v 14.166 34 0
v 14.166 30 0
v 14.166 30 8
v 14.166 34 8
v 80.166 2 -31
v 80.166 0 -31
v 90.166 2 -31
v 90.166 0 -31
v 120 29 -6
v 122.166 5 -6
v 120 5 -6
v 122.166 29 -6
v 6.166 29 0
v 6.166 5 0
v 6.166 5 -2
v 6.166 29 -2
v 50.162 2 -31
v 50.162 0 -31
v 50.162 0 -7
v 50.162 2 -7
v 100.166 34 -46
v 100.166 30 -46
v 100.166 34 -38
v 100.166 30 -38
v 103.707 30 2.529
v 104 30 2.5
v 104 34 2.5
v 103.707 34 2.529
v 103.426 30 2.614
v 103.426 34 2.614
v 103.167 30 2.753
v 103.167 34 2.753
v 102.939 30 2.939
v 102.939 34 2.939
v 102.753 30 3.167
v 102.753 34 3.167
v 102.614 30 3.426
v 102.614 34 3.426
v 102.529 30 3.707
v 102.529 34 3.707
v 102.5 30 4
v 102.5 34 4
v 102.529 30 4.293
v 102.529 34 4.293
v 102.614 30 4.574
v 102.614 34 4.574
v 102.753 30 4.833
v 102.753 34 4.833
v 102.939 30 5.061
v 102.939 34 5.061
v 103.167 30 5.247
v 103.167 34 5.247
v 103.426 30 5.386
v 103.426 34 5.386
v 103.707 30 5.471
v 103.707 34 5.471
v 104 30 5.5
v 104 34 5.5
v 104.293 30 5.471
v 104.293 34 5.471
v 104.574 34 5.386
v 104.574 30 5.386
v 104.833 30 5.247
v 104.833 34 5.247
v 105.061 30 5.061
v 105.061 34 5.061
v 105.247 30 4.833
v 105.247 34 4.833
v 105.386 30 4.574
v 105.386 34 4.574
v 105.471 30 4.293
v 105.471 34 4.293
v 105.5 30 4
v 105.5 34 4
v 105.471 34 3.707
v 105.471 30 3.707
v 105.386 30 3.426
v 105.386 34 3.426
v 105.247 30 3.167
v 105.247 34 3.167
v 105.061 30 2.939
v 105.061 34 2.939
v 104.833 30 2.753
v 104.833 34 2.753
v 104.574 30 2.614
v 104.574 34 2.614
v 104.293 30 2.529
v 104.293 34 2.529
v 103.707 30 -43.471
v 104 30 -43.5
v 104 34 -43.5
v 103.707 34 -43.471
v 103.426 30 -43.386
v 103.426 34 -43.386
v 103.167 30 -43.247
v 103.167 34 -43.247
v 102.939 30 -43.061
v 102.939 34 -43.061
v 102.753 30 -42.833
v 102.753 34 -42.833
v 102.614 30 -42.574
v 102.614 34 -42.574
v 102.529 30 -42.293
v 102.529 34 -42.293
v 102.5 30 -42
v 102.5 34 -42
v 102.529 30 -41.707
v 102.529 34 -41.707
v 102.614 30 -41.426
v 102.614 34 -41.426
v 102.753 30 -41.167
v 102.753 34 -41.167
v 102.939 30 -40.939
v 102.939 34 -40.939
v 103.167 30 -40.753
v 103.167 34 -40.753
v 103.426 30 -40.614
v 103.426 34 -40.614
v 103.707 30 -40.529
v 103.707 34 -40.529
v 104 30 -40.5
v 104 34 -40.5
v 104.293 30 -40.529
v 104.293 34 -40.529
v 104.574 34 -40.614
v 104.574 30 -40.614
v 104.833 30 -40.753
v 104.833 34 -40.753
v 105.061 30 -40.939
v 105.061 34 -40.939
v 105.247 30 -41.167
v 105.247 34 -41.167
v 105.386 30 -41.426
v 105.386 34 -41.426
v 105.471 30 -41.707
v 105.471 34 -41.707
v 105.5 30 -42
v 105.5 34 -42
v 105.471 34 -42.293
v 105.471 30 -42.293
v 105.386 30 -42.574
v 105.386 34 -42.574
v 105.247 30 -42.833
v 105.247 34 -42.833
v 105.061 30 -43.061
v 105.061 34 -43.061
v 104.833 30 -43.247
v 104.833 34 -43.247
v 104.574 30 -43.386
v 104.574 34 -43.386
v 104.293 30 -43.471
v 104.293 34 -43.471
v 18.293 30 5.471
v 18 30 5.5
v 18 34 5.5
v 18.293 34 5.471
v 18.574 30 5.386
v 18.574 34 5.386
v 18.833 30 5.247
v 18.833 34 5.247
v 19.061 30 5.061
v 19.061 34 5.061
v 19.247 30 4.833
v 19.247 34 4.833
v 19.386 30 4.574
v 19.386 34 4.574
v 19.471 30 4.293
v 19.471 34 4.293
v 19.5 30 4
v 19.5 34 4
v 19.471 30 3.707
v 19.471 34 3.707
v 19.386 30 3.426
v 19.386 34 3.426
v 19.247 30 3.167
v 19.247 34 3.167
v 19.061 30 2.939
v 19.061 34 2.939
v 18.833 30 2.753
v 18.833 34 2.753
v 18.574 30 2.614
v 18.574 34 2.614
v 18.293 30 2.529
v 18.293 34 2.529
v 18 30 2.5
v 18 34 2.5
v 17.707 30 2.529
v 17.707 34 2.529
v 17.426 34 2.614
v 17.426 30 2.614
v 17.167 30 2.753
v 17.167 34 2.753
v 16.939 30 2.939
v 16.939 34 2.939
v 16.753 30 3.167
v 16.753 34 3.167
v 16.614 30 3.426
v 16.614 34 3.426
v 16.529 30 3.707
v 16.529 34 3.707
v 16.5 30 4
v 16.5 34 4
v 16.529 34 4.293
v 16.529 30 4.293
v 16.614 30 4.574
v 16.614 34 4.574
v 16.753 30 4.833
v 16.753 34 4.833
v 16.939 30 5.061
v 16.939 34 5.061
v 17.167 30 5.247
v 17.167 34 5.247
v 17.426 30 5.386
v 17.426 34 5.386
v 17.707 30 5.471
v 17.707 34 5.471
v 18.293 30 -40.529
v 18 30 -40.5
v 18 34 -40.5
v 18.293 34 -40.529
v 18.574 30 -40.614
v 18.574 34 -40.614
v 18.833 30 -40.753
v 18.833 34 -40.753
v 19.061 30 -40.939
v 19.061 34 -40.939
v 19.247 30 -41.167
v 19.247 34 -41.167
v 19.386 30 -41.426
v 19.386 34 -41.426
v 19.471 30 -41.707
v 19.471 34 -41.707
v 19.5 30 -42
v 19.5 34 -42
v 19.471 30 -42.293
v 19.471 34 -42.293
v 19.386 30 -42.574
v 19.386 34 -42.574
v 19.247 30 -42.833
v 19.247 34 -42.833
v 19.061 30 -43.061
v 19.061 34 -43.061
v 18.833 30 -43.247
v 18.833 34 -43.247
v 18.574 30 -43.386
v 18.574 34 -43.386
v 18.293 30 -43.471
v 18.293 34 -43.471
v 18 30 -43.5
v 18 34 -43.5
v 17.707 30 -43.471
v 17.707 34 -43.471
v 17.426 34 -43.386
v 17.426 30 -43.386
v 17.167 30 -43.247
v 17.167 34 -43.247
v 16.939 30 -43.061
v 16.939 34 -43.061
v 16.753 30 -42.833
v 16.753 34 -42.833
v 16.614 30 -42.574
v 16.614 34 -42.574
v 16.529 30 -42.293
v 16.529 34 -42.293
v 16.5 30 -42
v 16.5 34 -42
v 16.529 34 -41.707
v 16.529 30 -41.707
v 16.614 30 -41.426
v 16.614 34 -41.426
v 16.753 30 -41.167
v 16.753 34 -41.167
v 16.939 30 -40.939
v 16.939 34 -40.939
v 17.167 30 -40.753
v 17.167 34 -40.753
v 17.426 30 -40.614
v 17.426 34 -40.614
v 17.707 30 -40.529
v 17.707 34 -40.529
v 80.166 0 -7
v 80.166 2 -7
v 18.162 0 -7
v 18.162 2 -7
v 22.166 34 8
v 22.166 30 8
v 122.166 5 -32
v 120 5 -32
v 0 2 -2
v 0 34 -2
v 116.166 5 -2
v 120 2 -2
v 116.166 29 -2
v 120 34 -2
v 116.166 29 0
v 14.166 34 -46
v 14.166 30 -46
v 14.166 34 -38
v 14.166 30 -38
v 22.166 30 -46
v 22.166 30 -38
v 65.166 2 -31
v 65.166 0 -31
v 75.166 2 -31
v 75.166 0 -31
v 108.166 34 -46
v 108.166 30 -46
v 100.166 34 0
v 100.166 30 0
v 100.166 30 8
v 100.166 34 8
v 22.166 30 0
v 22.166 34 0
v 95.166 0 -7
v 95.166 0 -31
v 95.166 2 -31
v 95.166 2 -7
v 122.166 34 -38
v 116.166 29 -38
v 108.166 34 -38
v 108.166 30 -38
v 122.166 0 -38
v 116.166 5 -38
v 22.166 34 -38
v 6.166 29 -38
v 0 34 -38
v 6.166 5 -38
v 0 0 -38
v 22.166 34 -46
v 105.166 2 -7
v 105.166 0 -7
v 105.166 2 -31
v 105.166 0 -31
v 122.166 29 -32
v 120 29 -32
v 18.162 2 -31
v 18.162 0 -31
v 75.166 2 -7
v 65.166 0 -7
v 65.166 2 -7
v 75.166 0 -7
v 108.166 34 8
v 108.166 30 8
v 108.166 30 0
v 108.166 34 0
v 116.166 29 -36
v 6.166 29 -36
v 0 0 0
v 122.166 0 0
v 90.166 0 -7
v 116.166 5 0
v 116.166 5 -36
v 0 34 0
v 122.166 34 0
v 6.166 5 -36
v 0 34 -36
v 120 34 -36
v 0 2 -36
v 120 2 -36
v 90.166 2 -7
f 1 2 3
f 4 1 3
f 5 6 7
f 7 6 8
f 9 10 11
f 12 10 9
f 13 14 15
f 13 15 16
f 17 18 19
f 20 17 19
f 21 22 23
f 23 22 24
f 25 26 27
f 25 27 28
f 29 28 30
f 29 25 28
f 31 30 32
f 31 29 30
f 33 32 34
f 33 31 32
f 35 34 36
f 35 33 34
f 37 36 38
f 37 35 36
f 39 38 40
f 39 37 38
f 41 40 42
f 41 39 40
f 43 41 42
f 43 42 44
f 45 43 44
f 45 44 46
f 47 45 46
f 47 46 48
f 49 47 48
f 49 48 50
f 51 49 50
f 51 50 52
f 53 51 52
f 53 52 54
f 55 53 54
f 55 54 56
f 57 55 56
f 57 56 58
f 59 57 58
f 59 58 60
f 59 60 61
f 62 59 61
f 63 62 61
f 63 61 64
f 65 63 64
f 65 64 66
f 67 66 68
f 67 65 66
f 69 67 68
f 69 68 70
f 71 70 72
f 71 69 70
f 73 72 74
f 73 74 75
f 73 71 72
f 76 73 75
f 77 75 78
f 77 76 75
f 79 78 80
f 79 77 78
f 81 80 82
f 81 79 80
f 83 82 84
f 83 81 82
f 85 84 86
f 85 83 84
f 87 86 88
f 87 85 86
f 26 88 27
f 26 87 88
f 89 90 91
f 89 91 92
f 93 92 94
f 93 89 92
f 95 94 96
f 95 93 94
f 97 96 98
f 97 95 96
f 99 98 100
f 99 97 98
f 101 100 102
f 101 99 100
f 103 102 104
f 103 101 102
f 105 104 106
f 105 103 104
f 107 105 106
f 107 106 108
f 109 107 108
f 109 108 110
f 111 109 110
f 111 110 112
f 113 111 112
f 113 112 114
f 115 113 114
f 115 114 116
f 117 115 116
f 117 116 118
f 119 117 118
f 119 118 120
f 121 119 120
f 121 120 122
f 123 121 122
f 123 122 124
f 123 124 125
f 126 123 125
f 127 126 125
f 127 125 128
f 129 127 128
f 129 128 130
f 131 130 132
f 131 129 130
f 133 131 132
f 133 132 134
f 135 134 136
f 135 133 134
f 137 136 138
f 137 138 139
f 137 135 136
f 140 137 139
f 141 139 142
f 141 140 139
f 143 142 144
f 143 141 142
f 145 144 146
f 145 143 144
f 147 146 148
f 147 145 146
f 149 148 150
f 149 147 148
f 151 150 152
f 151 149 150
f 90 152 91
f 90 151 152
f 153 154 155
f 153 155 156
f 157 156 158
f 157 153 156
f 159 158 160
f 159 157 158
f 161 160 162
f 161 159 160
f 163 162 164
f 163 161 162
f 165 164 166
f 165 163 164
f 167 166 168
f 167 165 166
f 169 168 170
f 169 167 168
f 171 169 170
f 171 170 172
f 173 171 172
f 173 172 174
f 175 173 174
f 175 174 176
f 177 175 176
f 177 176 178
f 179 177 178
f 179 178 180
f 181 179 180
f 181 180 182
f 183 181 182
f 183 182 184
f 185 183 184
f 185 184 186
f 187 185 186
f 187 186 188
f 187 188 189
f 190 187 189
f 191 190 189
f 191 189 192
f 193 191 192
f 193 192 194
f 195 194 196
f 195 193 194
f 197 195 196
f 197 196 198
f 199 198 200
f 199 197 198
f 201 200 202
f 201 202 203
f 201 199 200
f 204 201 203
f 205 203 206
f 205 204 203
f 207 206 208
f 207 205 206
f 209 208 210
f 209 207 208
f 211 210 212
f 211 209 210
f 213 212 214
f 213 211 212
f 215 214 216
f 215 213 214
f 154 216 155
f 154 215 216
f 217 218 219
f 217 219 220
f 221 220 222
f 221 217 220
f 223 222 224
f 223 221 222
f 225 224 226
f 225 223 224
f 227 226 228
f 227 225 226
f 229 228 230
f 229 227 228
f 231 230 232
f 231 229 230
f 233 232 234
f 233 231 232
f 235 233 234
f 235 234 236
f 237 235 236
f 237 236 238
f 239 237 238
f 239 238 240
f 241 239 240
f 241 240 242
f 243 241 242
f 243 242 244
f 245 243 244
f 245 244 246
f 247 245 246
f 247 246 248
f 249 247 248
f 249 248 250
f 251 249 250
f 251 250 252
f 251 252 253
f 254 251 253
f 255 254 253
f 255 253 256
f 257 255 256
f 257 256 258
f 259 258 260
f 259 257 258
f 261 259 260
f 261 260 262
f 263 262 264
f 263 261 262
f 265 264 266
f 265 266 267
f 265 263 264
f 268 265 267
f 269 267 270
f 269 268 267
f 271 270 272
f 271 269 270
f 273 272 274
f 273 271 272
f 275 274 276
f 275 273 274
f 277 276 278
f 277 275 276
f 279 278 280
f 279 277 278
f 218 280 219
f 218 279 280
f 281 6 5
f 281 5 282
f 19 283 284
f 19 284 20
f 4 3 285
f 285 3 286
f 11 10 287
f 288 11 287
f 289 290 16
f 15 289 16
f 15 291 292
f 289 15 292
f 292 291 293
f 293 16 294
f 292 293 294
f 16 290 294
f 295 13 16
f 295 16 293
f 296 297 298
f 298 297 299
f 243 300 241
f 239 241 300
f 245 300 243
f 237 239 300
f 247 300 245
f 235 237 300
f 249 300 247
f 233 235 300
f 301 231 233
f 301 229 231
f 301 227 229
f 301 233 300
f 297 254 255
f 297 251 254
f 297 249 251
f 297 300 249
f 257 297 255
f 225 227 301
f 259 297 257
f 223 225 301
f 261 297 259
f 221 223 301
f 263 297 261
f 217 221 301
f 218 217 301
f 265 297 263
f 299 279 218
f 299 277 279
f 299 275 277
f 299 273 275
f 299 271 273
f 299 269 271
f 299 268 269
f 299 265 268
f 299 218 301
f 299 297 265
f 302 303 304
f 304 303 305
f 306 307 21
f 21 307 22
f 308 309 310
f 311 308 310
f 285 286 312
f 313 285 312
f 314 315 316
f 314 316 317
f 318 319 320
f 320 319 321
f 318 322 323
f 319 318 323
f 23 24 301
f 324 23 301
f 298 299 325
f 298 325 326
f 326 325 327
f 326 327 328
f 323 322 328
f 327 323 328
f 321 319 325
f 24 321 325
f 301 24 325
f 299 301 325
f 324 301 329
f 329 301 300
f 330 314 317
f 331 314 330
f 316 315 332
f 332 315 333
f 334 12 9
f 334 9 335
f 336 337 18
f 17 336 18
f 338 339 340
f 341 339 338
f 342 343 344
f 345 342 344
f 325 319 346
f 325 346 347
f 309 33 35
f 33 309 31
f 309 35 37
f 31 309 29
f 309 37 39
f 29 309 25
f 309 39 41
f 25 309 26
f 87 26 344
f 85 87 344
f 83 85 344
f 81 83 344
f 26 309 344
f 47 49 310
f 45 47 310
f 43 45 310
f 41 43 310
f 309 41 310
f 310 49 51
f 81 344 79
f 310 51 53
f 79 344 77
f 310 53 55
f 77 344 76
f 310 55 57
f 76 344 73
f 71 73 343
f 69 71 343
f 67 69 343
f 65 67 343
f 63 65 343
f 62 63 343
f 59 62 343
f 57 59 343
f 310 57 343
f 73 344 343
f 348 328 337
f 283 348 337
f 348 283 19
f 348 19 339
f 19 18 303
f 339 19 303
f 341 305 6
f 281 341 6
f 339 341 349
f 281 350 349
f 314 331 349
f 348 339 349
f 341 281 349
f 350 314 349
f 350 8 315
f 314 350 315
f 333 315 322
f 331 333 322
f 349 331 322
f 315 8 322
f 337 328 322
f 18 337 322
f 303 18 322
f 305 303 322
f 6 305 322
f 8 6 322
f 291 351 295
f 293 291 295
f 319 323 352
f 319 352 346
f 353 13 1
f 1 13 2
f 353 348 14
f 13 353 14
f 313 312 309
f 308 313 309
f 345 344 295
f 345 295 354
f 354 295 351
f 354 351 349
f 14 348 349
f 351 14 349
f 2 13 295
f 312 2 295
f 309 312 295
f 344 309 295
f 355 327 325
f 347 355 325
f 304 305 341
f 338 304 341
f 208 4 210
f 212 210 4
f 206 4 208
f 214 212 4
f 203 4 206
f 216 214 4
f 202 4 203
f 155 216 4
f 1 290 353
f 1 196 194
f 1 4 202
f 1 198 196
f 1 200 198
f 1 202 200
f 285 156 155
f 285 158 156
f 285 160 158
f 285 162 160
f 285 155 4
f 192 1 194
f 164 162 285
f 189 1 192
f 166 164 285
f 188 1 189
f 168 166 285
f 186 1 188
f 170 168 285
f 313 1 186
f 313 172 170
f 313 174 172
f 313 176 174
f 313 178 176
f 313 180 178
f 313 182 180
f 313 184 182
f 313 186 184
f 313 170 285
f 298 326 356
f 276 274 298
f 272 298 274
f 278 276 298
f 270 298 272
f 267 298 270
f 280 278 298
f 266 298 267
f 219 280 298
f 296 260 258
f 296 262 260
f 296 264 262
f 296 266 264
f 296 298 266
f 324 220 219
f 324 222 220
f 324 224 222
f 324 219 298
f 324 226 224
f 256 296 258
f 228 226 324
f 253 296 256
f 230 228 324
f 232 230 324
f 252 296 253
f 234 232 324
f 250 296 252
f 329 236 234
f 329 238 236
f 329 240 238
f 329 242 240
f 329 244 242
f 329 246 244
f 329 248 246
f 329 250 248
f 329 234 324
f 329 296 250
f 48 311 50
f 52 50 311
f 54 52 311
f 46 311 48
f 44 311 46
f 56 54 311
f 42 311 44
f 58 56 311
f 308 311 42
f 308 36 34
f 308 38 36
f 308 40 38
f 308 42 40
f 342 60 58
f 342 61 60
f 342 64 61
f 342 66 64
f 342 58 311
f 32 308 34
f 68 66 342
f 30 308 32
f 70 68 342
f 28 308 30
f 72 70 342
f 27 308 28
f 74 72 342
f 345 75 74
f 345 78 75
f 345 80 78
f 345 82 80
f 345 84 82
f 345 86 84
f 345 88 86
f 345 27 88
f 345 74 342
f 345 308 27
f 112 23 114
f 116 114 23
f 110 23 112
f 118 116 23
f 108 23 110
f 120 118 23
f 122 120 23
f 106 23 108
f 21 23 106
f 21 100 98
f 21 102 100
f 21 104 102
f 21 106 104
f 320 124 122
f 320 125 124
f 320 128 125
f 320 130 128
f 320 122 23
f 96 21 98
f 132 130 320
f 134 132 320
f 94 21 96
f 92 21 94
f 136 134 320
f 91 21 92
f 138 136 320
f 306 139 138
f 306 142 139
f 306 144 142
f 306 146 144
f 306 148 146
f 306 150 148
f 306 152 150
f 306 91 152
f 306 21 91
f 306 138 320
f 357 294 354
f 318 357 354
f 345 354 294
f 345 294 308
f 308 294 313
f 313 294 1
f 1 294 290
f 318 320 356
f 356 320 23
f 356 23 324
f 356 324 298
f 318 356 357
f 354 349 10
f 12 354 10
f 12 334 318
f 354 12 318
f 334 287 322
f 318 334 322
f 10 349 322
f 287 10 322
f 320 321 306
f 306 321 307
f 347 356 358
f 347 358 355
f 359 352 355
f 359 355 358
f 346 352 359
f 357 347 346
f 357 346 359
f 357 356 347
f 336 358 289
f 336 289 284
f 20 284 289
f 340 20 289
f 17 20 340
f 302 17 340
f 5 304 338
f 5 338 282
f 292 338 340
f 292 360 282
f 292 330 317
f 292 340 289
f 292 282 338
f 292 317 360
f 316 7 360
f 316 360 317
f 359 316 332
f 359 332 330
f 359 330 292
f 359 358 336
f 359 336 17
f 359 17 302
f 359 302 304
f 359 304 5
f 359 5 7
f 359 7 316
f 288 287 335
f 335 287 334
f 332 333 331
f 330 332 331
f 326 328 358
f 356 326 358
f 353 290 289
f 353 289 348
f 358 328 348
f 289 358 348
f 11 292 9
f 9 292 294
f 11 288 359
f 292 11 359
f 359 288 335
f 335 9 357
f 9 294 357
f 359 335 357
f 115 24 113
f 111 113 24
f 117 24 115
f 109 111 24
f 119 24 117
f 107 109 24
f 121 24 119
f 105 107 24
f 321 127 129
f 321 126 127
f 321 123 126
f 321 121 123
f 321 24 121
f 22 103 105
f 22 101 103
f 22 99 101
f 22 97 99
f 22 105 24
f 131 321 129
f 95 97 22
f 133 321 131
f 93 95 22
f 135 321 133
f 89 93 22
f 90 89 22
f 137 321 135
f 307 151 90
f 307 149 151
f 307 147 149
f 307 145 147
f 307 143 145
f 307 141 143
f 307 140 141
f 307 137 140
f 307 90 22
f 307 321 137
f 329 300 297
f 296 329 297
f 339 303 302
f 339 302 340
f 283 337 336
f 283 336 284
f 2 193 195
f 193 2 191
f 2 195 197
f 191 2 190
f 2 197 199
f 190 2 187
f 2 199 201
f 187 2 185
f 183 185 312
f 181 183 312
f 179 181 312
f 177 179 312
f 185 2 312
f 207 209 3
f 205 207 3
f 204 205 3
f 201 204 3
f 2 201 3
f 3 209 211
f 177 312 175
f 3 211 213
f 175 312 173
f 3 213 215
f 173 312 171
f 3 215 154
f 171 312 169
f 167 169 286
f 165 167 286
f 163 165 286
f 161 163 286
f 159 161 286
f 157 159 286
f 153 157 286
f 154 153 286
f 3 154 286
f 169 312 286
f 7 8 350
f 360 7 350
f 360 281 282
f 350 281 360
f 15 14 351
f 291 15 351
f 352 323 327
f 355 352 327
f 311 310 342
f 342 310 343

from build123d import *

# Parameters (mm, degrees)
SKETCH1_R              = 1.5
BOSS_EXTRUDE2_DEPTH    = 34
SKETCH3_W              = 120
SKETCH3_H              = 34
CUT_EXTRUDE1_DEPTH     = 32
CUT_EXTRUDE4_START     = -8
CUT_EXTRUDE4_OUTLINE_W = 8
CUT_EXTRUDE4_OUTLINE_H = 30
CUT_EXTRUDE4_DEPTH     = 8
CUT_EXTRUDE5_DEPTH     = 8
SKETCH8_W              = 8
SKETCH8_H              = 30
CUT_EXTRUDE6_DEPTH     = 8
SKETCH9_W              = 8
SKETCH9_H              = 30
CUT_EXTRUDE7_DEPTH     = 8
SKETCH10_W             = 110
SKETCH10_H             = 24
CUT_EXTRUDE8_DEPTH     = 2
SKETCH11_W             = 110
SKETCH11_H             = 24
CUT_EXTRUDE9_DEPTH     = 2
SKETCH12_W             = 26
SKETCH12_H             = 24
CUT_EXTRUDE11_DEPTH    = 2.17
SKETCH13_W             = 10
SKETCH13_H             = 24
SKETCH13_W_2           = 32
CUT_EXTRUDE12_DEPTH    = 2


# Read off the part's stored shape, not the designer's step: Cut-Extrude4
with BuildPart() as part:
    # Sketch1 → Boss-Extrude2 (new body)
    with BuildSketch(Plane(origin=(0, 0, 0), x_dir=(1, 0, 0), z_dir=(0, 1, 0))):
        Polygon((0, 0), (14.166139068, 0), (14.166139068, -8), (22.166139068, -8), (22.166139068, 0), (100.166139068, 0), (100.166139068, -8), (108.166139068, -8), (108.166139068, 0), (122.166139068, 0), (122.166139068, 38), (108.166139068, 38), (108.166139068, 46), (100.166139068, 46), (100.166139068, 38), (22.166139068, 38), (22.166139068, 46), (14.166139068, 46), (14.166139068, 38), (0, 38), align=None)
        with Locations(Location((18, 42, 0), (0, 0, 270))):
            Circle(SKETCH1_R, mode=Mode.SUBTRACT)
        with Locations(Location((18, -4, 0), (0, 0, 270))):
            Circle(SKETCH1_R, mode=Mode.SUBTRACT)
        with Locations(Location((104, -4, 0), (0, 0, 90))):
            Circle(SKETCH1_R, mode=Mode.SUBTRACT)
        with Locations(Location((104, 42, 0), (0, 0, 90))):
            Circle(SKETCH1_R, mode=Mode.SUBTRACT)
    extrude(amount=BOSS_EXTRUDE2_DEPTH)

    # Sketch3 → Cut-Extrude1 (cut)
    with BuildSketch(Plane(origin=(0, 34, 0), x_dir=(1, 0, 0), z_dir=(0, 1, 0))):
        with Locations((60, 19)):
            Rectangle(SKETCH3_W, SKETCH3_H)
    extrude(amount=-CUT_EXTRUDE1_DEPTH, mode=Mode.SUBTRACT)

    # Cut-Extrude4 outline → Cut-Extrude4 (cut)
    with BuildSketch(Plane.ZY.offset(-14.166139068).offset(CUT_EXTRUDE4_START)):
        with Locations((4, 15)):
            Rectangle(CUT_EXTRUDE4_OUTLINE_W, CUT_EXTRUDE4_OUTLINE_H)
    extrude(amount=CUT_EXTRUDE4_DEPTH, mode=Mode.SUBTRACT)

    # Sketch7 → Cut-Extrude5 (cut)
    with BuildSketch(Plane(origin=(108.166139068, 0, 0), x_dir=(0, 0, -1), z_dir=(1, 0, 0))):
        Polygon((-4, 30), (0, 30), (0, 0), (-8, 0), (-8, 30), align=None)
    extrude(amount=-CUT_EXTRUDE5_DEPTH, mode=Mode.SUBTRACT)

    # Sketch8 → Cut-Extrude6 (cut)
    with BuildSketch(Plane(origin=(108.166139068, 0, 0), x_dir=(0, 0, -1), z_dir=(1, 0, 0))):
        with Locations((42, 15)):
            Rectangle(SKETCH8_W, SKETCH8_H)
    extrude(amount=-CUT_EXTRUDE6_DEPTH, mode=Mode.SUBTRACT)

    # Sketch9 → Cut-Extrude7 (cut)
    with BuildSketch(Plane.ZY.offset(-14.166139068)):
        with Locations((-42, 15)):
            Rectangle(SKETCH9_W, SKETCH9_H)
    extrude(amount=-CUT_EXTRUDE7_DEPTH, mode=Mode.SUBTRACT)

    # Sketch10 → Cut-Extrude8 (cut)
    with BuildSketch(Plane(origin=(0, 0, -38), x_dir=(-1, 0, 0), z_dir=(0, 0, -1))):
        with Locations((-61.166139068, 17)):
            Rectangle(SKETCH10_W, SKETCH10_H)
    extrude(amount=-CUT_EXTRUDE8_DEPTH, mode=Mode.SUBTRACT)

    # Sketch11 → Cut-Extrude9 (cut)
    with BuildSketch(Plane.XY):
        with Locations((61.166139068, 17)):
            Rectangle(SKETCH11_W, SKETCH11_H)
    extrude(amount=-CUT_EXTRUDE9_DEPTH, mode=Mode.SUBTRACT)

    # Sketch12 → Cut-Extrude11 (cut)
    with BuildSketch(Plane(origin=(122.166139068, 0, 0), x_dir=(0, 0, -1), z_dir=(1, 0, 0))):
        with Locations((19, 17)):
            Rectangle(SKETCH12_W, SKETCH12_H)
    extrude(amount=-CUT_EXTRUDE11_DEPTH, mode=Mode.SUBTRACT)

    # Sketch13 → Cut-Extrude12 (cut)
    with BuildSketch(Plane.XZ):
        with Locations((100.166139068, -19)):
            Rectangle(SKETCH13_W, SKETCH13_H)
        with Locations((85.166139068, -19)):
            Rectangle(SKETCH13_W, SKETCH13_H)
        with Locations((70.166139068, -19)):
            Rectangle(SKETCH13_W, SKETCH13_H)
        with Locations((34.16188968, -19)):
            Rectangle(SKETCH13_W_2, SKETCH13_H)
    extrude(amount=-CUT_EXTRUDE12_DEPTH, mode=Mode.SUBTRACT)


solid = part.part
